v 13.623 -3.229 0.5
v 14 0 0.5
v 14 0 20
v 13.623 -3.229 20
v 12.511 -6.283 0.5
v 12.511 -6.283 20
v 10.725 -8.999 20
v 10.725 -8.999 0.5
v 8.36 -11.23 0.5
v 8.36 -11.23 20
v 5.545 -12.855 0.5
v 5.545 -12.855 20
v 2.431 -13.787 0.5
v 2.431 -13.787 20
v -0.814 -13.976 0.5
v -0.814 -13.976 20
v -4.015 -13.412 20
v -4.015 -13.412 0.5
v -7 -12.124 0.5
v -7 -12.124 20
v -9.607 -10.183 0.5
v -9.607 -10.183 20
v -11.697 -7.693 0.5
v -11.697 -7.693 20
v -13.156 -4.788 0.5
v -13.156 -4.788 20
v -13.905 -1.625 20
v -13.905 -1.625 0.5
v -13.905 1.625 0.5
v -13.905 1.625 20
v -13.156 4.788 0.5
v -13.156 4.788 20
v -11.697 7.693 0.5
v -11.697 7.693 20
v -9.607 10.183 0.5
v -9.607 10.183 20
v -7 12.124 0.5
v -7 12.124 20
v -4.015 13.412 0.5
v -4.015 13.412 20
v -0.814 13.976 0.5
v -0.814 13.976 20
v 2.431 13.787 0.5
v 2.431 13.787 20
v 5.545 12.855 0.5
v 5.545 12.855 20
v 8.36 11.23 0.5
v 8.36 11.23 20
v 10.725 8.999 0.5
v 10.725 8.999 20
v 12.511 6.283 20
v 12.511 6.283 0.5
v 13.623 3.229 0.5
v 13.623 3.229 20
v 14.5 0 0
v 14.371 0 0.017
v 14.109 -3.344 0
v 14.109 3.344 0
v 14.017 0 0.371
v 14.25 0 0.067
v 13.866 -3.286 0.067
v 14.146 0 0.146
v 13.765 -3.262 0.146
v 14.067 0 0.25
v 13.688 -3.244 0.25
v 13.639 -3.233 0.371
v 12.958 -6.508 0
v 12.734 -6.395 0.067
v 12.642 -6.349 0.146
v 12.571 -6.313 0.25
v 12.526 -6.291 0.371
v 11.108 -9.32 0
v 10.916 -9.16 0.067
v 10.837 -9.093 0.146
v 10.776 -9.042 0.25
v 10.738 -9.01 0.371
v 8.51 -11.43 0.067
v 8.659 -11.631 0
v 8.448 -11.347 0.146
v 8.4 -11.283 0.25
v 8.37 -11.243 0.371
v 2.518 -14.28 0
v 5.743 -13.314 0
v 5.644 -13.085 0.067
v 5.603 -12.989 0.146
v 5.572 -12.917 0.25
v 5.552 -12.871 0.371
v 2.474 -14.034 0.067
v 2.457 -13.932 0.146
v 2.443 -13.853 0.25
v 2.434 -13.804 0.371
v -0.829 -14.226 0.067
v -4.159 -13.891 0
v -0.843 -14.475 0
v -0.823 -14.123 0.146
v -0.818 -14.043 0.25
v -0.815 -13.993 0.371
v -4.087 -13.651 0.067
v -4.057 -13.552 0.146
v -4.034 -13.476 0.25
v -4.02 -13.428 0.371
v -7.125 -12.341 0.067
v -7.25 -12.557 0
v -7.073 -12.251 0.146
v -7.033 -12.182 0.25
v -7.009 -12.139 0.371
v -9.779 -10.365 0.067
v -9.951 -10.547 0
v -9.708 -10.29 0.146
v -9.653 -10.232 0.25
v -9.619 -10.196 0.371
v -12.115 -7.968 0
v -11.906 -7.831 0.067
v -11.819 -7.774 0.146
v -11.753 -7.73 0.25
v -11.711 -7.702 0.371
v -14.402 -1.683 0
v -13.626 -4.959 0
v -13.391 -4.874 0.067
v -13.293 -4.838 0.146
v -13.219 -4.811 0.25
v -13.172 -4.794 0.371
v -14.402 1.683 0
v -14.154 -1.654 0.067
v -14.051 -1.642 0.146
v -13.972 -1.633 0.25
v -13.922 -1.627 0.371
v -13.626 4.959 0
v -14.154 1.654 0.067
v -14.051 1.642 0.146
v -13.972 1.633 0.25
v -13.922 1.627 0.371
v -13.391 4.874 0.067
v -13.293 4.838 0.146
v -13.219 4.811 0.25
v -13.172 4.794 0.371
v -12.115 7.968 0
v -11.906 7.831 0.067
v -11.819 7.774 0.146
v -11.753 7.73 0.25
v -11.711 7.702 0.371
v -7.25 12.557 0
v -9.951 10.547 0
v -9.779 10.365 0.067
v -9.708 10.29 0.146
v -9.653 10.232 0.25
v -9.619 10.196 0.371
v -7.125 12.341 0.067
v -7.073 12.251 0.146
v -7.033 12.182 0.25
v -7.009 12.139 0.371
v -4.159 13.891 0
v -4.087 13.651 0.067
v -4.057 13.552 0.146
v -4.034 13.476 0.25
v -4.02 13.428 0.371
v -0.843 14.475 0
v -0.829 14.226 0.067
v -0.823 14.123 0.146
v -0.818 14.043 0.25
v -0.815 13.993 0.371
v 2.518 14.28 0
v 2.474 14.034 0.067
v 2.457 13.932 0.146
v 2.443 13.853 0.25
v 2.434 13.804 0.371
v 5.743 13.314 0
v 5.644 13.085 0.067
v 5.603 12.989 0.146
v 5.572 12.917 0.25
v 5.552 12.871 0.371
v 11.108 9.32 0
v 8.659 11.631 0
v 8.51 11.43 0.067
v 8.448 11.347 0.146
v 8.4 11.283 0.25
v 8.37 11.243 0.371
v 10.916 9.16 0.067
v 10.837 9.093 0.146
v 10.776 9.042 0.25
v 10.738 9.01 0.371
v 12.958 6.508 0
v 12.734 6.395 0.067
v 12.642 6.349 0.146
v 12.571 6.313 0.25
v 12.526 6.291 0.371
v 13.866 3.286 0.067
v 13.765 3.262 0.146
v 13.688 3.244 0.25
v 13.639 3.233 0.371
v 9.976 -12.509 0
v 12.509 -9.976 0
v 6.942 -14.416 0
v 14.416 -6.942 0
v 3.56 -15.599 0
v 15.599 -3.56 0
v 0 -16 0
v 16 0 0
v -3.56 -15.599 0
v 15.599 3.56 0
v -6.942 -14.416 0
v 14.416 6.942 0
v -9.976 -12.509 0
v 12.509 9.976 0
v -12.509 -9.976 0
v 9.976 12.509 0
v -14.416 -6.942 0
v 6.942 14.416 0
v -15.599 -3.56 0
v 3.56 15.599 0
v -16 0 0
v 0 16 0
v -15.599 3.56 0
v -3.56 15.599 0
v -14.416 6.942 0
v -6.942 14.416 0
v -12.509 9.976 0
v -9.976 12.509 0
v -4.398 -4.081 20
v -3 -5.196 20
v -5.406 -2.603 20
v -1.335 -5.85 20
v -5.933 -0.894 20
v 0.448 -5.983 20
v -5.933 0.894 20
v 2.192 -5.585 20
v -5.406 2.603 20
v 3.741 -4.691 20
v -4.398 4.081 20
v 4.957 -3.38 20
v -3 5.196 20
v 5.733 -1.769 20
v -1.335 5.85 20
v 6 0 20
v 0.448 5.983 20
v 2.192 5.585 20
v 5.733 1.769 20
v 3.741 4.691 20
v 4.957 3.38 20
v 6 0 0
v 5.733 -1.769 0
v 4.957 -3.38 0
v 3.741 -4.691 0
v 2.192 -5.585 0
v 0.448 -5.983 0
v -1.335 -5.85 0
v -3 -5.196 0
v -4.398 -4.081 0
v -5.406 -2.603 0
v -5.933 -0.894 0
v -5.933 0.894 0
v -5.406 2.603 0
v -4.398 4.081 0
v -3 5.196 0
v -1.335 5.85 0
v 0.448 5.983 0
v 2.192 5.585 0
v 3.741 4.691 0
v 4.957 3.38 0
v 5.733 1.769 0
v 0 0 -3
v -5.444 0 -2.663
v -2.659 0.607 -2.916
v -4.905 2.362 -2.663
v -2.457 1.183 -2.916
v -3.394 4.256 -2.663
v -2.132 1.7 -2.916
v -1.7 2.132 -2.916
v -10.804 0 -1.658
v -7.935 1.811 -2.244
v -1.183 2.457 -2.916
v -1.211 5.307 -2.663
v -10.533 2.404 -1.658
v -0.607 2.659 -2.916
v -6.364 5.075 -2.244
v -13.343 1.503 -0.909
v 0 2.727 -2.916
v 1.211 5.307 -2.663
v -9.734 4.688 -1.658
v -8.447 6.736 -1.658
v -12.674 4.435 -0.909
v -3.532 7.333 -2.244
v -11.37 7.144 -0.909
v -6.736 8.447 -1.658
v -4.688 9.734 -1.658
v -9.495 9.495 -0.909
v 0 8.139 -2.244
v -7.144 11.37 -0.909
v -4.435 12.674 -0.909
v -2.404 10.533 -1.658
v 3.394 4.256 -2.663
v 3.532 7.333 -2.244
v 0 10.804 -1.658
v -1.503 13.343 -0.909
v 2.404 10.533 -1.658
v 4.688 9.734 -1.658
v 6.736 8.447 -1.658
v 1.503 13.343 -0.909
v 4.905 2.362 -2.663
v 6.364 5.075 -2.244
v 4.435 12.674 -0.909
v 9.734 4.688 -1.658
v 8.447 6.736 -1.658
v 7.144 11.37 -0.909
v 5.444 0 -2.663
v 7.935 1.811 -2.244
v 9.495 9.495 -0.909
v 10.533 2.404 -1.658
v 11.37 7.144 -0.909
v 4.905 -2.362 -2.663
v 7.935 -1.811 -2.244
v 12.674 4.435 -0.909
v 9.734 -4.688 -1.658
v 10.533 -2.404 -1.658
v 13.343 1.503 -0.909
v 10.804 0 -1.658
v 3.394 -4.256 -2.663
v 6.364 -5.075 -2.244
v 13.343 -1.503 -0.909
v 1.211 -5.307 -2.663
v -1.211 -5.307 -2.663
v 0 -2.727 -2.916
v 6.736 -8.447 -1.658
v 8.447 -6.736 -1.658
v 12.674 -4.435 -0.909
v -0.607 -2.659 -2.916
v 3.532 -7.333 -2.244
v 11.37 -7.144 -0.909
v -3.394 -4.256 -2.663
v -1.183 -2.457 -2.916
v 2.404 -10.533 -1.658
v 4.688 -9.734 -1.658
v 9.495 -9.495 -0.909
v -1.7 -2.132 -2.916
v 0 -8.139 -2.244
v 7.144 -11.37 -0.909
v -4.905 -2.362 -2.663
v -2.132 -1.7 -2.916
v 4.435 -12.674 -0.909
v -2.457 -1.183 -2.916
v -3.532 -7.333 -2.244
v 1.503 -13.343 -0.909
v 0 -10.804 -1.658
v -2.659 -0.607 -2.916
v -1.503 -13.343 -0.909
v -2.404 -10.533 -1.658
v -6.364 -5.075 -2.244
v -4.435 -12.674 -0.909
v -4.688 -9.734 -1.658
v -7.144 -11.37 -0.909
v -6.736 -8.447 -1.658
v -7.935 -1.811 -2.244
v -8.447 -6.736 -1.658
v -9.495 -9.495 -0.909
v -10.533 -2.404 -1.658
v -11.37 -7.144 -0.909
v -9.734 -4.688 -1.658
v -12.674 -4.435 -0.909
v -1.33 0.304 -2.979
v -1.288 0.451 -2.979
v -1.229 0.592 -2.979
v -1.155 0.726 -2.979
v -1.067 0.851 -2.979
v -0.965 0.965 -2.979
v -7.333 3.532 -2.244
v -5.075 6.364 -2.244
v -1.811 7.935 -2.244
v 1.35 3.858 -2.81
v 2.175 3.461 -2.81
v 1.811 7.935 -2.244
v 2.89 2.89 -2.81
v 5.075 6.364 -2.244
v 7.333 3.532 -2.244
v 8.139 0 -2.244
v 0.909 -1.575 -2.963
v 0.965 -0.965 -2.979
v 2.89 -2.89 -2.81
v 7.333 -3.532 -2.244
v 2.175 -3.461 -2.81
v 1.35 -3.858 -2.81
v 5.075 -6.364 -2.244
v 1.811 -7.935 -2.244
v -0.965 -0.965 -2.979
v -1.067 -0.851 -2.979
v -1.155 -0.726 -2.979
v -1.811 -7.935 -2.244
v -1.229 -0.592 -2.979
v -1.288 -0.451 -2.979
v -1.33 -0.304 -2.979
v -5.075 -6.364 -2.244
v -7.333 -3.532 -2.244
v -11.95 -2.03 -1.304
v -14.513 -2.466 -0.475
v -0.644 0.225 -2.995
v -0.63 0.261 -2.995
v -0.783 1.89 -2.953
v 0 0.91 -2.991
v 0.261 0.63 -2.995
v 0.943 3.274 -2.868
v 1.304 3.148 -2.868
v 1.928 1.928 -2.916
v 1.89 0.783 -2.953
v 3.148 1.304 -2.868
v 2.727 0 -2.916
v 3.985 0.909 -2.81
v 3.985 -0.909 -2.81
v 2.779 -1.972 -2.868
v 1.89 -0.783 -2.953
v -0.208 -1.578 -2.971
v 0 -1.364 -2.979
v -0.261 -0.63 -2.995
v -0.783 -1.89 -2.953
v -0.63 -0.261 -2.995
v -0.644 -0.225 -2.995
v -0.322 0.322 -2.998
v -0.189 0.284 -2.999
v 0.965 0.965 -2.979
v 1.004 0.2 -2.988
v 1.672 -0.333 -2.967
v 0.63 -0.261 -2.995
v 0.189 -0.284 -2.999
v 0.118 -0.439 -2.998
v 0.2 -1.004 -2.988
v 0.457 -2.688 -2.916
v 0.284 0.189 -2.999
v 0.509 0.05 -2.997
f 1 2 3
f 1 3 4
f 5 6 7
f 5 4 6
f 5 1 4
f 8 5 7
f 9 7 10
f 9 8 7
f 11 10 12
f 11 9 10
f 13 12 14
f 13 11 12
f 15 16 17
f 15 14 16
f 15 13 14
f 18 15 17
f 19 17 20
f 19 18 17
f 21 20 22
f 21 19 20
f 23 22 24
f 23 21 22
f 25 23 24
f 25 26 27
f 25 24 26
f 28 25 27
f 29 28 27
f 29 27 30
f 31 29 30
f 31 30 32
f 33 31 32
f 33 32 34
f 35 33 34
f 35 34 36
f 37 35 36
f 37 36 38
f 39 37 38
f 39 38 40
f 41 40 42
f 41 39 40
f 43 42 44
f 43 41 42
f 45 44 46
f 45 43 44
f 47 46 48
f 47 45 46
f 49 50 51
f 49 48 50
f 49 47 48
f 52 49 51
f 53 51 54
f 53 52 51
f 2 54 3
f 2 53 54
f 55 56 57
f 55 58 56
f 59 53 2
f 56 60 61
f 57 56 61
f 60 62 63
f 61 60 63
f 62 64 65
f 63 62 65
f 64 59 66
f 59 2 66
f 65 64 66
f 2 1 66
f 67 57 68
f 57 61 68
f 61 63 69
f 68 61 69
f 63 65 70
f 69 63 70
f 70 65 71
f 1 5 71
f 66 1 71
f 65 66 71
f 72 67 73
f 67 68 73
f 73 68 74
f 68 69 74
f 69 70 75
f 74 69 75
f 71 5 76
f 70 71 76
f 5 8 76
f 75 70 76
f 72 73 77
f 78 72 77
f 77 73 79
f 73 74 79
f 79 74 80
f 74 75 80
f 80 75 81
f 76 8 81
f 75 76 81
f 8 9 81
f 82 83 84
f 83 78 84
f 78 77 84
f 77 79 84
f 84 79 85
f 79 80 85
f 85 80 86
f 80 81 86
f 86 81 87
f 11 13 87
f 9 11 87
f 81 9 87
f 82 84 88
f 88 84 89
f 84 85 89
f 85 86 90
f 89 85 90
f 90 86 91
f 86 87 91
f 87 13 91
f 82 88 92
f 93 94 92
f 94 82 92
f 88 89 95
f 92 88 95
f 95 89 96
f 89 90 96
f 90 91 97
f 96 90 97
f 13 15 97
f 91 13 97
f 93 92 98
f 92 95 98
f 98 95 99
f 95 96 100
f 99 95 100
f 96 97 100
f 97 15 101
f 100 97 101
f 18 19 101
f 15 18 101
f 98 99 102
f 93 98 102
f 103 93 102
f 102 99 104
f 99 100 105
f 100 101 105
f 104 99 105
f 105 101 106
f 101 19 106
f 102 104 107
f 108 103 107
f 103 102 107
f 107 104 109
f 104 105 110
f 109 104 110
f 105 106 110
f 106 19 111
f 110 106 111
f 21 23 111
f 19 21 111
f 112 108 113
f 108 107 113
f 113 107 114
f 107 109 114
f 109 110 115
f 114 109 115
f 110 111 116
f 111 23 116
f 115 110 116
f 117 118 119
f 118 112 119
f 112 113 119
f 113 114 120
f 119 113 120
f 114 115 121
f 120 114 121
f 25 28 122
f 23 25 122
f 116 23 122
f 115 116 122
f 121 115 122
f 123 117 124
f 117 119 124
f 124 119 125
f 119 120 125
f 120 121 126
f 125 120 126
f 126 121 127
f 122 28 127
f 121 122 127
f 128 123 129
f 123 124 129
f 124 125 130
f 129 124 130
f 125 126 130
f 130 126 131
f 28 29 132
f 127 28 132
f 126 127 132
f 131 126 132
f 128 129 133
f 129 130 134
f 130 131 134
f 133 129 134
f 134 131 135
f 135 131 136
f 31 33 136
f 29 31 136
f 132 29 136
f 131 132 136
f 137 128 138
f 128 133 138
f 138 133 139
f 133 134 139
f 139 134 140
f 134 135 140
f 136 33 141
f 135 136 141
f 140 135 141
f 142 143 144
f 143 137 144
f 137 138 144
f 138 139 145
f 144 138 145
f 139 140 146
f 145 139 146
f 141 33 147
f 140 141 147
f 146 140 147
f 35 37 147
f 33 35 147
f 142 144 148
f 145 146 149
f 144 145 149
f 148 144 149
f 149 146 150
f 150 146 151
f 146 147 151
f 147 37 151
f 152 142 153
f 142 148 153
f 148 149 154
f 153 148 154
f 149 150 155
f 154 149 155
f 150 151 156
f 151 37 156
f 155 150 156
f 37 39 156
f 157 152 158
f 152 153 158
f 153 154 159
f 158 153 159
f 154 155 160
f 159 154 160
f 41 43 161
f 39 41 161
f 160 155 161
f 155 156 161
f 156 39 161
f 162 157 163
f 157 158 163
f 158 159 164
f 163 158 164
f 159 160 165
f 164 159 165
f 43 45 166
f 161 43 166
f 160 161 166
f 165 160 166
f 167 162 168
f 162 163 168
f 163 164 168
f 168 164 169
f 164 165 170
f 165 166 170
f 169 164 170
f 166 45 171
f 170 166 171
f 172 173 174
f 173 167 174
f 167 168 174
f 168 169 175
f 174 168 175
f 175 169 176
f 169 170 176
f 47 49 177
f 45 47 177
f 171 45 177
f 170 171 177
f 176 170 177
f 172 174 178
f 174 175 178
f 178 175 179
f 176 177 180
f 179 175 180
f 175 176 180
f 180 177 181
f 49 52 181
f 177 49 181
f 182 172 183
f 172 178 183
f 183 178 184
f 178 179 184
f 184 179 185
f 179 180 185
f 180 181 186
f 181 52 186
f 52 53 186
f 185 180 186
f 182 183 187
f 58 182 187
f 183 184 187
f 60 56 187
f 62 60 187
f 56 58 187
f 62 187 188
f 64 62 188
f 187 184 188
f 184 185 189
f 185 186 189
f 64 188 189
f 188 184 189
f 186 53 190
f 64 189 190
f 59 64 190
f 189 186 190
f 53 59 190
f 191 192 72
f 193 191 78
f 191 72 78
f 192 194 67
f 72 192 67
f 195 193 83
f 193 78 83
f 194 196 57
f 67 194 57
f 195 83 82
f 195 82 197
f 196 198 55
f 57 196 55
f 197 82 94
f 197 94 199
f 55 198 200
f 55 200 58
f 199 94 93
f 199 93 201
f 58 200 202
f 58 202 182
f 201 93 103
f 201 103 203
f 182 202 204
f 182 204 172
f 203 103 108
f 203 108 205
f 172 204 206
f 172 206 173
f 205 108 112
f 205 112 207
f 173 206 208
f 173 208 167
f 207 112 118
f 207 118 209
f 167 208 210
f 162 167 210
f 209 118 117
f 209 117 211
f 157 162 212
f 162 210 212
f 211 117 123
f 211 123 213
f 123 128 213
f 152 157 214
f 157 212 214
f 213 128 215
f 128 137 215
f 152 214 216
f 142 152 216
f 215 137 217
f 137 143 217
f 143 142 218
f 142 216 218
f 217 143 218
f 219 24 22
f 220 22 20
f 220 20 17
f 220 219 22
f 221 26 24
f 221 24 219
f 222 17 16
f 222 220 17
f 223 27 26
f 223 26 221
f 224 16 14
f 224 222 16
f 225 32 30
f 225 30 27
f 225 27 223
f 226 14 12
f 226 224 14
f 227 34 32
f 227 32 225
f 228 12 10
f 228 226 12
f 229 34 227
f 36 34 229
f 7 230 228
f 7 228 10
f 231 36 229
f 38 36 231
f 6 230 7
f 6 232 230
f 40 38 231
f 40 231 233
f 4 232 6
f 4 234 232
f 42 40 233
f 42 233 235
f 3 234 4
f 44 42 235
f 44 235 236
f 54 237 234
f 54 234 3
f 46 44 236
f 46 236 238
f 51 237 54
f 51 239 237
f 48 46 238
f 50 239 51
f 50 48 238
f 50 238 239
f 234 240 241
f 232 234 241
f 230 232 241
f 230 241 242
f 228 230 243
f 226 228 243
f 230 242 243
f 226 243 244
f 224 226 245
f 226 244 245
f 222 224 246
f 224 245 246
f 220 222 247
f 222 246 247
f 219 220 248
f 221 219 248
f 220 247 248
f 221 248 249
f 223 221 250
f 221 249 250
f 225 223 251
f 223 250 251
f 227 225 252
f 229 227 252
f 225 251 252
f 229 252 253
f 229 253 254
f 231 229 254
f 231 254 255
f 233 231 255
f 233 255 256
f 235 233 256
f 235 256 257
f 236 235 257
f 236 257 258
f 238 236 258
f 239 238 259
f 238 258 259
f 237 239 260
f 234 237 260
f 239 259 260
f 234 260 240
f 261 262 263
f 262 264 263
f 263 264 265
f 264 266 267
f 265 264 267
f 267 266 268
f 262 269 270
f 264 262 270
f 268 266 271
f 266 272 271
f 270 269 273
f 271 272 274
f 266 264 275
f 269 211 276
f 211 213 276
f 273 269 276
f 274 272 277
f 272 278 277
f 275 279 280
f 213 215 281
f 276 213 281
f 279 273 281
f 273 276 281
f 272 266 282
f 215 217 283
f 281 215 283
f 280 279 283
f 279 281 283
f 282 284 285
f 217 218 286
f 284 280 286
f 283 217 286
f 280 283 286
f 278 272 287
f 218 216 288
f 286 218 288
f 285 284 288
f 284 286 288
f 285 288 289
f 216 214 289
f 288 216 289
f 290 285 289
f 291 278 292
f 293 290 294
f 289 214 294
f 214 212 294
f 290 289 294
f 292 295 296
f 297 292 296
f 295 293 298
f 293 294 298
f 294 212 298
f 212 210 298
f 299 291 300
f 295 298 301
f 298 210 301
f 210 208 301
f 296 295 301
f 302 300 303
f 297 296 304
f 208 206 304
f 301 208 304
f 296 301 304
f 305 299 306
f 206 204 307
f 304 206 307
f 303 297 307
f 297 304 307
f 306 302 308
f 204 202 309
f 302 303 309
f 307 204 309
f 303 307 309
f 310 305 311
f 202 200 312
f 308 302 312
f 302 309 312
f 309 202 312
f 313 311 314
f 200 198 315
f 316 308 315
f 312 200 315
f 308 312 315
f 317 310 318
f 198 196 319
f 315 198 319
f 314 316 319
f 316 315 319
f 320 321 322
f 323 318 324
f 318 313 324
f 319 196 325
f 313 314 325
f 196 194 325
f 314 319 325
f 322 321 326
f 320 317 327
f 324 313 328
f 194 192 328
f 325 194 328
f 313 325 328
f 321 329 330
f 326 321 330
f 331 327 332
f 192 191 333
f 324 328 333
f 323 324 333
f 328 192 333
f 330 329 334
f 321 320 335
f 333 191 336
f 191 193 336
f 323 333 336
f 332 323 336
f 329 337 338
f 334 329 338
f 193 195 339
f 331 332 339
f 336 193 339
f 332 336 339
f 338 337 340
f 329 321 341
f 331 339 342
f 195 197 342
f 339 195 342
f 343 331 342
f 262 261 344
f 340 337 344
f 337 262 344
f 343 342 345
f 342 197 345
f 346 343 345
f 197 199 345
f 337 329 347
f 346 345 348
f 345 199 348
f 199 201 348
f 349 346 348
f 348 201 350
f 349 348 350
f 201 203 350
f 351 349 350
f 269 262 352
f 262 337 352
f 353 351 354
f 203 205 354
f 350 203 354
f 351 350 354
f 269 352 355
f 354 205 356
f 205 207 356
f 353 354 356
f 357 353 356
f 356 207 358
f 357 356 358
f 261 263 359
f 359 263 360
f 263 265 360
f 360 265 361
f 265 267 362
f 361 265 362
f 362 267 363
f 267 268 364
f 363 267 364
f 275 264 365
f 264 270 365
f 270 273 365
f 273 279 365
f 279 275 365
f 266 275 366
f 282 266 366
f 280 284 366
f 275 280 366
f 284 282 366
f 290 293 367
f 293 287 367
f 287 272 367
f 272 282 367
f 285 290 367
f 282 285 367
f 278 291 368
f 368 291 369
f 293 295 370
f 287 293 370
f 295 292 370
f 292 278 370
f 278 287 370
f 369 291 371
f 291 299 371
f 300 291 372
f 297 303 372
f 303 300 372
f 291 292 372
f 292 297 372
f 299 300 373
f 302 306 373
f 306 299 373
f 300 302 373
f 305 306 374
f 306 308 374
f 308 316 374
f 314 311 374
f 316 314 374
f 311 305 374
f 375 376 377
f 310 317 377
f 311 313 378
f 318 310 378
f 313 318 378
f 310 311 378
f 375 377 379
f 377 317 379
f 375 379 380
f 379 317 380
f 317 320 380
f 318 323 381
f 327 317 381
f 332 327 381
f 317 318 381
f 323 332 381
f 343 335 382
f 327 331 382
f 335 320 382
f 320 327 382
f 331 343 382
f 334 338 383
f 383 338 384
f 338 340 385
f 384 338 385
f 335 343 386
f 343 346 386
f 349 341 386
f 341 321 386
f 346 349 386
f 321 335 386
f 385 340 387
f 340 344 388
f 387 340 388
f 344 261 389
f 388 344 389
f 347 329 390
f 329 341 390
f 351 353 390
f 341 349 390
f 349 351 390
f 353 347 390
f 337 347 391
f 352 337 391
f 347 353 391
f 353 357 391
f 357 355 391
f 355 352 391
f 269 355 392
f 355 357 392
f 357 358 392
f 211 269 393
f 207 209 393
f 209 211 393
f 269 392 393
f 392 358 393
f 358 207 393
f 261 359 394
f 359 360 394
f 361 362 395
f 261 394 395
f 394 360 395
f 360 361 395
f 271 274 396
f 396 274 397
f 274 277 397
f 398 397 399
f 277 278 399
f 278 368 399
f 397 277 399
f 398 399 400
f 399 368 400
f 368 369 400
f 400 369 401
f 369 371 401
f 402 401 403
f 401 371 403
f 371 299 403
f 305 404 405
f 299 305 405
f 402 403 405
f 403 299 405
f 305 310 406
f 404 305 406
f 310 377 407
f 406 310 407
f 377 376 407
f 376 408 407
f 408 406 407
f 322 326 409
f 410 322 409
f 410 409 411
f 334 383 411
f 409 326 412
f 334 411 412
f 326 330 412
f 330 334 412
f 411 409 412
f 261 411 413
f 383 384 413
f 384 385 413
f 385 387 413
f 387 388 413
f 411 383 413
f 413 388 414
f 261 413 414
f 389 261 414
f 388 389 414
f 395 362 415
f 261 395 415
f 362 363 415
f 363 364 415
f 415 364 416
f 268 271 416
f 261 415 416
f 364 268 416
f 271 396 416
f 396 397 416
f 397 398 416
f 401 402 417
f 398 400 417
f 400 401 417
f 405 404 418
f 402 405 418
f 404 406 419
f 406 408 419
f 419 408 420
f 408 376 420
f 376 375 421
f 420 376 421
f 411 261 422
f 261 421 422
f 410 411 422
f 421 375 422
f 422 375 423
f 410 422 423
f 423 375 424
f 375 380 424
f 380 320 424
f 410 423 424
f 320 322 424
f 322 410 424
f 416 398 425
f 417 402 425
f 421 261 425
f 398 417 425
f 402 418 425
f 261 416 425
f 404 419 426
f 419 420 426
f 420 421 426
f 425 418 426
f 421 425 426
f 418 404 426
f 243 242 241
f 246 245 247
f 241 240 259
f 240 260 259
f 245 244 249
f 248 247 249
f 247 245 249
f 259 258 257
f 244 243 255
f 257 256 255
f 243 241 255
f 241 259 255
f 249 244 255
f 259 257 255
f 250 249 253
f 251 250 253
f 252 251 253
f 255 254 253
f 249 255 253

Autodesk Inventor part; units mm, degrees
ref_plane "YZ Plane" through (0, 0, 0) normal (1, 0, 0) x (0, 1, 0)
ref_plane "XZ Plane" through (0, 0, 0) normal (0, 1, 0) x (-1, 0, 0)
ref_plane "XY Plane" through (0, 0, 0) normal (0, 0, 1) x (1, 0, 0)
sketch "Szkic1" plane through (0, 0, 0) normal (0, 0, 1) x (1, 0, 0)
  circle A0 centre (0, 0) radius 14
  dimension "d0" = 28
extrude "Wyciągnięcie proste1" add sketch "Szkic1" along normal blind 20
shell "Skorupa1" thickness 8 removed faces 2 at (0.5625, 1.5565, 0) at (0.5625, 1.5565, 20)
sketch "Szkic2" plane through (0, 0, 0) normal (0, 1, 0) x (-1, 0, 0)
  line L0 (-14, 0) -> (14, 0) construction
  line L1 (0, 0) -> (16, 0)
  line L2 (0, 0) -> (0, -3)
  arc A0 (0, -3) -> (16, 0) centre (0, 41.1667) ccw
  dimension "d4" = 16
  dimension "d5" = 3
revolve "Obrót1" add sketch "Szkic2" angle 360 about axis through (0, 0, 0) along (0, 0, -1)
fillet "Zaokrąglenie1" radius 0.5 1 edges at (-14, 0, 0)
thread "Gwint1" size "M12x1.75" class "6H" standard "ANSI Metric M Profile" full length
properties part number "Zaślepka_do_widelca" material "Polietylen o dużej gęstości"
